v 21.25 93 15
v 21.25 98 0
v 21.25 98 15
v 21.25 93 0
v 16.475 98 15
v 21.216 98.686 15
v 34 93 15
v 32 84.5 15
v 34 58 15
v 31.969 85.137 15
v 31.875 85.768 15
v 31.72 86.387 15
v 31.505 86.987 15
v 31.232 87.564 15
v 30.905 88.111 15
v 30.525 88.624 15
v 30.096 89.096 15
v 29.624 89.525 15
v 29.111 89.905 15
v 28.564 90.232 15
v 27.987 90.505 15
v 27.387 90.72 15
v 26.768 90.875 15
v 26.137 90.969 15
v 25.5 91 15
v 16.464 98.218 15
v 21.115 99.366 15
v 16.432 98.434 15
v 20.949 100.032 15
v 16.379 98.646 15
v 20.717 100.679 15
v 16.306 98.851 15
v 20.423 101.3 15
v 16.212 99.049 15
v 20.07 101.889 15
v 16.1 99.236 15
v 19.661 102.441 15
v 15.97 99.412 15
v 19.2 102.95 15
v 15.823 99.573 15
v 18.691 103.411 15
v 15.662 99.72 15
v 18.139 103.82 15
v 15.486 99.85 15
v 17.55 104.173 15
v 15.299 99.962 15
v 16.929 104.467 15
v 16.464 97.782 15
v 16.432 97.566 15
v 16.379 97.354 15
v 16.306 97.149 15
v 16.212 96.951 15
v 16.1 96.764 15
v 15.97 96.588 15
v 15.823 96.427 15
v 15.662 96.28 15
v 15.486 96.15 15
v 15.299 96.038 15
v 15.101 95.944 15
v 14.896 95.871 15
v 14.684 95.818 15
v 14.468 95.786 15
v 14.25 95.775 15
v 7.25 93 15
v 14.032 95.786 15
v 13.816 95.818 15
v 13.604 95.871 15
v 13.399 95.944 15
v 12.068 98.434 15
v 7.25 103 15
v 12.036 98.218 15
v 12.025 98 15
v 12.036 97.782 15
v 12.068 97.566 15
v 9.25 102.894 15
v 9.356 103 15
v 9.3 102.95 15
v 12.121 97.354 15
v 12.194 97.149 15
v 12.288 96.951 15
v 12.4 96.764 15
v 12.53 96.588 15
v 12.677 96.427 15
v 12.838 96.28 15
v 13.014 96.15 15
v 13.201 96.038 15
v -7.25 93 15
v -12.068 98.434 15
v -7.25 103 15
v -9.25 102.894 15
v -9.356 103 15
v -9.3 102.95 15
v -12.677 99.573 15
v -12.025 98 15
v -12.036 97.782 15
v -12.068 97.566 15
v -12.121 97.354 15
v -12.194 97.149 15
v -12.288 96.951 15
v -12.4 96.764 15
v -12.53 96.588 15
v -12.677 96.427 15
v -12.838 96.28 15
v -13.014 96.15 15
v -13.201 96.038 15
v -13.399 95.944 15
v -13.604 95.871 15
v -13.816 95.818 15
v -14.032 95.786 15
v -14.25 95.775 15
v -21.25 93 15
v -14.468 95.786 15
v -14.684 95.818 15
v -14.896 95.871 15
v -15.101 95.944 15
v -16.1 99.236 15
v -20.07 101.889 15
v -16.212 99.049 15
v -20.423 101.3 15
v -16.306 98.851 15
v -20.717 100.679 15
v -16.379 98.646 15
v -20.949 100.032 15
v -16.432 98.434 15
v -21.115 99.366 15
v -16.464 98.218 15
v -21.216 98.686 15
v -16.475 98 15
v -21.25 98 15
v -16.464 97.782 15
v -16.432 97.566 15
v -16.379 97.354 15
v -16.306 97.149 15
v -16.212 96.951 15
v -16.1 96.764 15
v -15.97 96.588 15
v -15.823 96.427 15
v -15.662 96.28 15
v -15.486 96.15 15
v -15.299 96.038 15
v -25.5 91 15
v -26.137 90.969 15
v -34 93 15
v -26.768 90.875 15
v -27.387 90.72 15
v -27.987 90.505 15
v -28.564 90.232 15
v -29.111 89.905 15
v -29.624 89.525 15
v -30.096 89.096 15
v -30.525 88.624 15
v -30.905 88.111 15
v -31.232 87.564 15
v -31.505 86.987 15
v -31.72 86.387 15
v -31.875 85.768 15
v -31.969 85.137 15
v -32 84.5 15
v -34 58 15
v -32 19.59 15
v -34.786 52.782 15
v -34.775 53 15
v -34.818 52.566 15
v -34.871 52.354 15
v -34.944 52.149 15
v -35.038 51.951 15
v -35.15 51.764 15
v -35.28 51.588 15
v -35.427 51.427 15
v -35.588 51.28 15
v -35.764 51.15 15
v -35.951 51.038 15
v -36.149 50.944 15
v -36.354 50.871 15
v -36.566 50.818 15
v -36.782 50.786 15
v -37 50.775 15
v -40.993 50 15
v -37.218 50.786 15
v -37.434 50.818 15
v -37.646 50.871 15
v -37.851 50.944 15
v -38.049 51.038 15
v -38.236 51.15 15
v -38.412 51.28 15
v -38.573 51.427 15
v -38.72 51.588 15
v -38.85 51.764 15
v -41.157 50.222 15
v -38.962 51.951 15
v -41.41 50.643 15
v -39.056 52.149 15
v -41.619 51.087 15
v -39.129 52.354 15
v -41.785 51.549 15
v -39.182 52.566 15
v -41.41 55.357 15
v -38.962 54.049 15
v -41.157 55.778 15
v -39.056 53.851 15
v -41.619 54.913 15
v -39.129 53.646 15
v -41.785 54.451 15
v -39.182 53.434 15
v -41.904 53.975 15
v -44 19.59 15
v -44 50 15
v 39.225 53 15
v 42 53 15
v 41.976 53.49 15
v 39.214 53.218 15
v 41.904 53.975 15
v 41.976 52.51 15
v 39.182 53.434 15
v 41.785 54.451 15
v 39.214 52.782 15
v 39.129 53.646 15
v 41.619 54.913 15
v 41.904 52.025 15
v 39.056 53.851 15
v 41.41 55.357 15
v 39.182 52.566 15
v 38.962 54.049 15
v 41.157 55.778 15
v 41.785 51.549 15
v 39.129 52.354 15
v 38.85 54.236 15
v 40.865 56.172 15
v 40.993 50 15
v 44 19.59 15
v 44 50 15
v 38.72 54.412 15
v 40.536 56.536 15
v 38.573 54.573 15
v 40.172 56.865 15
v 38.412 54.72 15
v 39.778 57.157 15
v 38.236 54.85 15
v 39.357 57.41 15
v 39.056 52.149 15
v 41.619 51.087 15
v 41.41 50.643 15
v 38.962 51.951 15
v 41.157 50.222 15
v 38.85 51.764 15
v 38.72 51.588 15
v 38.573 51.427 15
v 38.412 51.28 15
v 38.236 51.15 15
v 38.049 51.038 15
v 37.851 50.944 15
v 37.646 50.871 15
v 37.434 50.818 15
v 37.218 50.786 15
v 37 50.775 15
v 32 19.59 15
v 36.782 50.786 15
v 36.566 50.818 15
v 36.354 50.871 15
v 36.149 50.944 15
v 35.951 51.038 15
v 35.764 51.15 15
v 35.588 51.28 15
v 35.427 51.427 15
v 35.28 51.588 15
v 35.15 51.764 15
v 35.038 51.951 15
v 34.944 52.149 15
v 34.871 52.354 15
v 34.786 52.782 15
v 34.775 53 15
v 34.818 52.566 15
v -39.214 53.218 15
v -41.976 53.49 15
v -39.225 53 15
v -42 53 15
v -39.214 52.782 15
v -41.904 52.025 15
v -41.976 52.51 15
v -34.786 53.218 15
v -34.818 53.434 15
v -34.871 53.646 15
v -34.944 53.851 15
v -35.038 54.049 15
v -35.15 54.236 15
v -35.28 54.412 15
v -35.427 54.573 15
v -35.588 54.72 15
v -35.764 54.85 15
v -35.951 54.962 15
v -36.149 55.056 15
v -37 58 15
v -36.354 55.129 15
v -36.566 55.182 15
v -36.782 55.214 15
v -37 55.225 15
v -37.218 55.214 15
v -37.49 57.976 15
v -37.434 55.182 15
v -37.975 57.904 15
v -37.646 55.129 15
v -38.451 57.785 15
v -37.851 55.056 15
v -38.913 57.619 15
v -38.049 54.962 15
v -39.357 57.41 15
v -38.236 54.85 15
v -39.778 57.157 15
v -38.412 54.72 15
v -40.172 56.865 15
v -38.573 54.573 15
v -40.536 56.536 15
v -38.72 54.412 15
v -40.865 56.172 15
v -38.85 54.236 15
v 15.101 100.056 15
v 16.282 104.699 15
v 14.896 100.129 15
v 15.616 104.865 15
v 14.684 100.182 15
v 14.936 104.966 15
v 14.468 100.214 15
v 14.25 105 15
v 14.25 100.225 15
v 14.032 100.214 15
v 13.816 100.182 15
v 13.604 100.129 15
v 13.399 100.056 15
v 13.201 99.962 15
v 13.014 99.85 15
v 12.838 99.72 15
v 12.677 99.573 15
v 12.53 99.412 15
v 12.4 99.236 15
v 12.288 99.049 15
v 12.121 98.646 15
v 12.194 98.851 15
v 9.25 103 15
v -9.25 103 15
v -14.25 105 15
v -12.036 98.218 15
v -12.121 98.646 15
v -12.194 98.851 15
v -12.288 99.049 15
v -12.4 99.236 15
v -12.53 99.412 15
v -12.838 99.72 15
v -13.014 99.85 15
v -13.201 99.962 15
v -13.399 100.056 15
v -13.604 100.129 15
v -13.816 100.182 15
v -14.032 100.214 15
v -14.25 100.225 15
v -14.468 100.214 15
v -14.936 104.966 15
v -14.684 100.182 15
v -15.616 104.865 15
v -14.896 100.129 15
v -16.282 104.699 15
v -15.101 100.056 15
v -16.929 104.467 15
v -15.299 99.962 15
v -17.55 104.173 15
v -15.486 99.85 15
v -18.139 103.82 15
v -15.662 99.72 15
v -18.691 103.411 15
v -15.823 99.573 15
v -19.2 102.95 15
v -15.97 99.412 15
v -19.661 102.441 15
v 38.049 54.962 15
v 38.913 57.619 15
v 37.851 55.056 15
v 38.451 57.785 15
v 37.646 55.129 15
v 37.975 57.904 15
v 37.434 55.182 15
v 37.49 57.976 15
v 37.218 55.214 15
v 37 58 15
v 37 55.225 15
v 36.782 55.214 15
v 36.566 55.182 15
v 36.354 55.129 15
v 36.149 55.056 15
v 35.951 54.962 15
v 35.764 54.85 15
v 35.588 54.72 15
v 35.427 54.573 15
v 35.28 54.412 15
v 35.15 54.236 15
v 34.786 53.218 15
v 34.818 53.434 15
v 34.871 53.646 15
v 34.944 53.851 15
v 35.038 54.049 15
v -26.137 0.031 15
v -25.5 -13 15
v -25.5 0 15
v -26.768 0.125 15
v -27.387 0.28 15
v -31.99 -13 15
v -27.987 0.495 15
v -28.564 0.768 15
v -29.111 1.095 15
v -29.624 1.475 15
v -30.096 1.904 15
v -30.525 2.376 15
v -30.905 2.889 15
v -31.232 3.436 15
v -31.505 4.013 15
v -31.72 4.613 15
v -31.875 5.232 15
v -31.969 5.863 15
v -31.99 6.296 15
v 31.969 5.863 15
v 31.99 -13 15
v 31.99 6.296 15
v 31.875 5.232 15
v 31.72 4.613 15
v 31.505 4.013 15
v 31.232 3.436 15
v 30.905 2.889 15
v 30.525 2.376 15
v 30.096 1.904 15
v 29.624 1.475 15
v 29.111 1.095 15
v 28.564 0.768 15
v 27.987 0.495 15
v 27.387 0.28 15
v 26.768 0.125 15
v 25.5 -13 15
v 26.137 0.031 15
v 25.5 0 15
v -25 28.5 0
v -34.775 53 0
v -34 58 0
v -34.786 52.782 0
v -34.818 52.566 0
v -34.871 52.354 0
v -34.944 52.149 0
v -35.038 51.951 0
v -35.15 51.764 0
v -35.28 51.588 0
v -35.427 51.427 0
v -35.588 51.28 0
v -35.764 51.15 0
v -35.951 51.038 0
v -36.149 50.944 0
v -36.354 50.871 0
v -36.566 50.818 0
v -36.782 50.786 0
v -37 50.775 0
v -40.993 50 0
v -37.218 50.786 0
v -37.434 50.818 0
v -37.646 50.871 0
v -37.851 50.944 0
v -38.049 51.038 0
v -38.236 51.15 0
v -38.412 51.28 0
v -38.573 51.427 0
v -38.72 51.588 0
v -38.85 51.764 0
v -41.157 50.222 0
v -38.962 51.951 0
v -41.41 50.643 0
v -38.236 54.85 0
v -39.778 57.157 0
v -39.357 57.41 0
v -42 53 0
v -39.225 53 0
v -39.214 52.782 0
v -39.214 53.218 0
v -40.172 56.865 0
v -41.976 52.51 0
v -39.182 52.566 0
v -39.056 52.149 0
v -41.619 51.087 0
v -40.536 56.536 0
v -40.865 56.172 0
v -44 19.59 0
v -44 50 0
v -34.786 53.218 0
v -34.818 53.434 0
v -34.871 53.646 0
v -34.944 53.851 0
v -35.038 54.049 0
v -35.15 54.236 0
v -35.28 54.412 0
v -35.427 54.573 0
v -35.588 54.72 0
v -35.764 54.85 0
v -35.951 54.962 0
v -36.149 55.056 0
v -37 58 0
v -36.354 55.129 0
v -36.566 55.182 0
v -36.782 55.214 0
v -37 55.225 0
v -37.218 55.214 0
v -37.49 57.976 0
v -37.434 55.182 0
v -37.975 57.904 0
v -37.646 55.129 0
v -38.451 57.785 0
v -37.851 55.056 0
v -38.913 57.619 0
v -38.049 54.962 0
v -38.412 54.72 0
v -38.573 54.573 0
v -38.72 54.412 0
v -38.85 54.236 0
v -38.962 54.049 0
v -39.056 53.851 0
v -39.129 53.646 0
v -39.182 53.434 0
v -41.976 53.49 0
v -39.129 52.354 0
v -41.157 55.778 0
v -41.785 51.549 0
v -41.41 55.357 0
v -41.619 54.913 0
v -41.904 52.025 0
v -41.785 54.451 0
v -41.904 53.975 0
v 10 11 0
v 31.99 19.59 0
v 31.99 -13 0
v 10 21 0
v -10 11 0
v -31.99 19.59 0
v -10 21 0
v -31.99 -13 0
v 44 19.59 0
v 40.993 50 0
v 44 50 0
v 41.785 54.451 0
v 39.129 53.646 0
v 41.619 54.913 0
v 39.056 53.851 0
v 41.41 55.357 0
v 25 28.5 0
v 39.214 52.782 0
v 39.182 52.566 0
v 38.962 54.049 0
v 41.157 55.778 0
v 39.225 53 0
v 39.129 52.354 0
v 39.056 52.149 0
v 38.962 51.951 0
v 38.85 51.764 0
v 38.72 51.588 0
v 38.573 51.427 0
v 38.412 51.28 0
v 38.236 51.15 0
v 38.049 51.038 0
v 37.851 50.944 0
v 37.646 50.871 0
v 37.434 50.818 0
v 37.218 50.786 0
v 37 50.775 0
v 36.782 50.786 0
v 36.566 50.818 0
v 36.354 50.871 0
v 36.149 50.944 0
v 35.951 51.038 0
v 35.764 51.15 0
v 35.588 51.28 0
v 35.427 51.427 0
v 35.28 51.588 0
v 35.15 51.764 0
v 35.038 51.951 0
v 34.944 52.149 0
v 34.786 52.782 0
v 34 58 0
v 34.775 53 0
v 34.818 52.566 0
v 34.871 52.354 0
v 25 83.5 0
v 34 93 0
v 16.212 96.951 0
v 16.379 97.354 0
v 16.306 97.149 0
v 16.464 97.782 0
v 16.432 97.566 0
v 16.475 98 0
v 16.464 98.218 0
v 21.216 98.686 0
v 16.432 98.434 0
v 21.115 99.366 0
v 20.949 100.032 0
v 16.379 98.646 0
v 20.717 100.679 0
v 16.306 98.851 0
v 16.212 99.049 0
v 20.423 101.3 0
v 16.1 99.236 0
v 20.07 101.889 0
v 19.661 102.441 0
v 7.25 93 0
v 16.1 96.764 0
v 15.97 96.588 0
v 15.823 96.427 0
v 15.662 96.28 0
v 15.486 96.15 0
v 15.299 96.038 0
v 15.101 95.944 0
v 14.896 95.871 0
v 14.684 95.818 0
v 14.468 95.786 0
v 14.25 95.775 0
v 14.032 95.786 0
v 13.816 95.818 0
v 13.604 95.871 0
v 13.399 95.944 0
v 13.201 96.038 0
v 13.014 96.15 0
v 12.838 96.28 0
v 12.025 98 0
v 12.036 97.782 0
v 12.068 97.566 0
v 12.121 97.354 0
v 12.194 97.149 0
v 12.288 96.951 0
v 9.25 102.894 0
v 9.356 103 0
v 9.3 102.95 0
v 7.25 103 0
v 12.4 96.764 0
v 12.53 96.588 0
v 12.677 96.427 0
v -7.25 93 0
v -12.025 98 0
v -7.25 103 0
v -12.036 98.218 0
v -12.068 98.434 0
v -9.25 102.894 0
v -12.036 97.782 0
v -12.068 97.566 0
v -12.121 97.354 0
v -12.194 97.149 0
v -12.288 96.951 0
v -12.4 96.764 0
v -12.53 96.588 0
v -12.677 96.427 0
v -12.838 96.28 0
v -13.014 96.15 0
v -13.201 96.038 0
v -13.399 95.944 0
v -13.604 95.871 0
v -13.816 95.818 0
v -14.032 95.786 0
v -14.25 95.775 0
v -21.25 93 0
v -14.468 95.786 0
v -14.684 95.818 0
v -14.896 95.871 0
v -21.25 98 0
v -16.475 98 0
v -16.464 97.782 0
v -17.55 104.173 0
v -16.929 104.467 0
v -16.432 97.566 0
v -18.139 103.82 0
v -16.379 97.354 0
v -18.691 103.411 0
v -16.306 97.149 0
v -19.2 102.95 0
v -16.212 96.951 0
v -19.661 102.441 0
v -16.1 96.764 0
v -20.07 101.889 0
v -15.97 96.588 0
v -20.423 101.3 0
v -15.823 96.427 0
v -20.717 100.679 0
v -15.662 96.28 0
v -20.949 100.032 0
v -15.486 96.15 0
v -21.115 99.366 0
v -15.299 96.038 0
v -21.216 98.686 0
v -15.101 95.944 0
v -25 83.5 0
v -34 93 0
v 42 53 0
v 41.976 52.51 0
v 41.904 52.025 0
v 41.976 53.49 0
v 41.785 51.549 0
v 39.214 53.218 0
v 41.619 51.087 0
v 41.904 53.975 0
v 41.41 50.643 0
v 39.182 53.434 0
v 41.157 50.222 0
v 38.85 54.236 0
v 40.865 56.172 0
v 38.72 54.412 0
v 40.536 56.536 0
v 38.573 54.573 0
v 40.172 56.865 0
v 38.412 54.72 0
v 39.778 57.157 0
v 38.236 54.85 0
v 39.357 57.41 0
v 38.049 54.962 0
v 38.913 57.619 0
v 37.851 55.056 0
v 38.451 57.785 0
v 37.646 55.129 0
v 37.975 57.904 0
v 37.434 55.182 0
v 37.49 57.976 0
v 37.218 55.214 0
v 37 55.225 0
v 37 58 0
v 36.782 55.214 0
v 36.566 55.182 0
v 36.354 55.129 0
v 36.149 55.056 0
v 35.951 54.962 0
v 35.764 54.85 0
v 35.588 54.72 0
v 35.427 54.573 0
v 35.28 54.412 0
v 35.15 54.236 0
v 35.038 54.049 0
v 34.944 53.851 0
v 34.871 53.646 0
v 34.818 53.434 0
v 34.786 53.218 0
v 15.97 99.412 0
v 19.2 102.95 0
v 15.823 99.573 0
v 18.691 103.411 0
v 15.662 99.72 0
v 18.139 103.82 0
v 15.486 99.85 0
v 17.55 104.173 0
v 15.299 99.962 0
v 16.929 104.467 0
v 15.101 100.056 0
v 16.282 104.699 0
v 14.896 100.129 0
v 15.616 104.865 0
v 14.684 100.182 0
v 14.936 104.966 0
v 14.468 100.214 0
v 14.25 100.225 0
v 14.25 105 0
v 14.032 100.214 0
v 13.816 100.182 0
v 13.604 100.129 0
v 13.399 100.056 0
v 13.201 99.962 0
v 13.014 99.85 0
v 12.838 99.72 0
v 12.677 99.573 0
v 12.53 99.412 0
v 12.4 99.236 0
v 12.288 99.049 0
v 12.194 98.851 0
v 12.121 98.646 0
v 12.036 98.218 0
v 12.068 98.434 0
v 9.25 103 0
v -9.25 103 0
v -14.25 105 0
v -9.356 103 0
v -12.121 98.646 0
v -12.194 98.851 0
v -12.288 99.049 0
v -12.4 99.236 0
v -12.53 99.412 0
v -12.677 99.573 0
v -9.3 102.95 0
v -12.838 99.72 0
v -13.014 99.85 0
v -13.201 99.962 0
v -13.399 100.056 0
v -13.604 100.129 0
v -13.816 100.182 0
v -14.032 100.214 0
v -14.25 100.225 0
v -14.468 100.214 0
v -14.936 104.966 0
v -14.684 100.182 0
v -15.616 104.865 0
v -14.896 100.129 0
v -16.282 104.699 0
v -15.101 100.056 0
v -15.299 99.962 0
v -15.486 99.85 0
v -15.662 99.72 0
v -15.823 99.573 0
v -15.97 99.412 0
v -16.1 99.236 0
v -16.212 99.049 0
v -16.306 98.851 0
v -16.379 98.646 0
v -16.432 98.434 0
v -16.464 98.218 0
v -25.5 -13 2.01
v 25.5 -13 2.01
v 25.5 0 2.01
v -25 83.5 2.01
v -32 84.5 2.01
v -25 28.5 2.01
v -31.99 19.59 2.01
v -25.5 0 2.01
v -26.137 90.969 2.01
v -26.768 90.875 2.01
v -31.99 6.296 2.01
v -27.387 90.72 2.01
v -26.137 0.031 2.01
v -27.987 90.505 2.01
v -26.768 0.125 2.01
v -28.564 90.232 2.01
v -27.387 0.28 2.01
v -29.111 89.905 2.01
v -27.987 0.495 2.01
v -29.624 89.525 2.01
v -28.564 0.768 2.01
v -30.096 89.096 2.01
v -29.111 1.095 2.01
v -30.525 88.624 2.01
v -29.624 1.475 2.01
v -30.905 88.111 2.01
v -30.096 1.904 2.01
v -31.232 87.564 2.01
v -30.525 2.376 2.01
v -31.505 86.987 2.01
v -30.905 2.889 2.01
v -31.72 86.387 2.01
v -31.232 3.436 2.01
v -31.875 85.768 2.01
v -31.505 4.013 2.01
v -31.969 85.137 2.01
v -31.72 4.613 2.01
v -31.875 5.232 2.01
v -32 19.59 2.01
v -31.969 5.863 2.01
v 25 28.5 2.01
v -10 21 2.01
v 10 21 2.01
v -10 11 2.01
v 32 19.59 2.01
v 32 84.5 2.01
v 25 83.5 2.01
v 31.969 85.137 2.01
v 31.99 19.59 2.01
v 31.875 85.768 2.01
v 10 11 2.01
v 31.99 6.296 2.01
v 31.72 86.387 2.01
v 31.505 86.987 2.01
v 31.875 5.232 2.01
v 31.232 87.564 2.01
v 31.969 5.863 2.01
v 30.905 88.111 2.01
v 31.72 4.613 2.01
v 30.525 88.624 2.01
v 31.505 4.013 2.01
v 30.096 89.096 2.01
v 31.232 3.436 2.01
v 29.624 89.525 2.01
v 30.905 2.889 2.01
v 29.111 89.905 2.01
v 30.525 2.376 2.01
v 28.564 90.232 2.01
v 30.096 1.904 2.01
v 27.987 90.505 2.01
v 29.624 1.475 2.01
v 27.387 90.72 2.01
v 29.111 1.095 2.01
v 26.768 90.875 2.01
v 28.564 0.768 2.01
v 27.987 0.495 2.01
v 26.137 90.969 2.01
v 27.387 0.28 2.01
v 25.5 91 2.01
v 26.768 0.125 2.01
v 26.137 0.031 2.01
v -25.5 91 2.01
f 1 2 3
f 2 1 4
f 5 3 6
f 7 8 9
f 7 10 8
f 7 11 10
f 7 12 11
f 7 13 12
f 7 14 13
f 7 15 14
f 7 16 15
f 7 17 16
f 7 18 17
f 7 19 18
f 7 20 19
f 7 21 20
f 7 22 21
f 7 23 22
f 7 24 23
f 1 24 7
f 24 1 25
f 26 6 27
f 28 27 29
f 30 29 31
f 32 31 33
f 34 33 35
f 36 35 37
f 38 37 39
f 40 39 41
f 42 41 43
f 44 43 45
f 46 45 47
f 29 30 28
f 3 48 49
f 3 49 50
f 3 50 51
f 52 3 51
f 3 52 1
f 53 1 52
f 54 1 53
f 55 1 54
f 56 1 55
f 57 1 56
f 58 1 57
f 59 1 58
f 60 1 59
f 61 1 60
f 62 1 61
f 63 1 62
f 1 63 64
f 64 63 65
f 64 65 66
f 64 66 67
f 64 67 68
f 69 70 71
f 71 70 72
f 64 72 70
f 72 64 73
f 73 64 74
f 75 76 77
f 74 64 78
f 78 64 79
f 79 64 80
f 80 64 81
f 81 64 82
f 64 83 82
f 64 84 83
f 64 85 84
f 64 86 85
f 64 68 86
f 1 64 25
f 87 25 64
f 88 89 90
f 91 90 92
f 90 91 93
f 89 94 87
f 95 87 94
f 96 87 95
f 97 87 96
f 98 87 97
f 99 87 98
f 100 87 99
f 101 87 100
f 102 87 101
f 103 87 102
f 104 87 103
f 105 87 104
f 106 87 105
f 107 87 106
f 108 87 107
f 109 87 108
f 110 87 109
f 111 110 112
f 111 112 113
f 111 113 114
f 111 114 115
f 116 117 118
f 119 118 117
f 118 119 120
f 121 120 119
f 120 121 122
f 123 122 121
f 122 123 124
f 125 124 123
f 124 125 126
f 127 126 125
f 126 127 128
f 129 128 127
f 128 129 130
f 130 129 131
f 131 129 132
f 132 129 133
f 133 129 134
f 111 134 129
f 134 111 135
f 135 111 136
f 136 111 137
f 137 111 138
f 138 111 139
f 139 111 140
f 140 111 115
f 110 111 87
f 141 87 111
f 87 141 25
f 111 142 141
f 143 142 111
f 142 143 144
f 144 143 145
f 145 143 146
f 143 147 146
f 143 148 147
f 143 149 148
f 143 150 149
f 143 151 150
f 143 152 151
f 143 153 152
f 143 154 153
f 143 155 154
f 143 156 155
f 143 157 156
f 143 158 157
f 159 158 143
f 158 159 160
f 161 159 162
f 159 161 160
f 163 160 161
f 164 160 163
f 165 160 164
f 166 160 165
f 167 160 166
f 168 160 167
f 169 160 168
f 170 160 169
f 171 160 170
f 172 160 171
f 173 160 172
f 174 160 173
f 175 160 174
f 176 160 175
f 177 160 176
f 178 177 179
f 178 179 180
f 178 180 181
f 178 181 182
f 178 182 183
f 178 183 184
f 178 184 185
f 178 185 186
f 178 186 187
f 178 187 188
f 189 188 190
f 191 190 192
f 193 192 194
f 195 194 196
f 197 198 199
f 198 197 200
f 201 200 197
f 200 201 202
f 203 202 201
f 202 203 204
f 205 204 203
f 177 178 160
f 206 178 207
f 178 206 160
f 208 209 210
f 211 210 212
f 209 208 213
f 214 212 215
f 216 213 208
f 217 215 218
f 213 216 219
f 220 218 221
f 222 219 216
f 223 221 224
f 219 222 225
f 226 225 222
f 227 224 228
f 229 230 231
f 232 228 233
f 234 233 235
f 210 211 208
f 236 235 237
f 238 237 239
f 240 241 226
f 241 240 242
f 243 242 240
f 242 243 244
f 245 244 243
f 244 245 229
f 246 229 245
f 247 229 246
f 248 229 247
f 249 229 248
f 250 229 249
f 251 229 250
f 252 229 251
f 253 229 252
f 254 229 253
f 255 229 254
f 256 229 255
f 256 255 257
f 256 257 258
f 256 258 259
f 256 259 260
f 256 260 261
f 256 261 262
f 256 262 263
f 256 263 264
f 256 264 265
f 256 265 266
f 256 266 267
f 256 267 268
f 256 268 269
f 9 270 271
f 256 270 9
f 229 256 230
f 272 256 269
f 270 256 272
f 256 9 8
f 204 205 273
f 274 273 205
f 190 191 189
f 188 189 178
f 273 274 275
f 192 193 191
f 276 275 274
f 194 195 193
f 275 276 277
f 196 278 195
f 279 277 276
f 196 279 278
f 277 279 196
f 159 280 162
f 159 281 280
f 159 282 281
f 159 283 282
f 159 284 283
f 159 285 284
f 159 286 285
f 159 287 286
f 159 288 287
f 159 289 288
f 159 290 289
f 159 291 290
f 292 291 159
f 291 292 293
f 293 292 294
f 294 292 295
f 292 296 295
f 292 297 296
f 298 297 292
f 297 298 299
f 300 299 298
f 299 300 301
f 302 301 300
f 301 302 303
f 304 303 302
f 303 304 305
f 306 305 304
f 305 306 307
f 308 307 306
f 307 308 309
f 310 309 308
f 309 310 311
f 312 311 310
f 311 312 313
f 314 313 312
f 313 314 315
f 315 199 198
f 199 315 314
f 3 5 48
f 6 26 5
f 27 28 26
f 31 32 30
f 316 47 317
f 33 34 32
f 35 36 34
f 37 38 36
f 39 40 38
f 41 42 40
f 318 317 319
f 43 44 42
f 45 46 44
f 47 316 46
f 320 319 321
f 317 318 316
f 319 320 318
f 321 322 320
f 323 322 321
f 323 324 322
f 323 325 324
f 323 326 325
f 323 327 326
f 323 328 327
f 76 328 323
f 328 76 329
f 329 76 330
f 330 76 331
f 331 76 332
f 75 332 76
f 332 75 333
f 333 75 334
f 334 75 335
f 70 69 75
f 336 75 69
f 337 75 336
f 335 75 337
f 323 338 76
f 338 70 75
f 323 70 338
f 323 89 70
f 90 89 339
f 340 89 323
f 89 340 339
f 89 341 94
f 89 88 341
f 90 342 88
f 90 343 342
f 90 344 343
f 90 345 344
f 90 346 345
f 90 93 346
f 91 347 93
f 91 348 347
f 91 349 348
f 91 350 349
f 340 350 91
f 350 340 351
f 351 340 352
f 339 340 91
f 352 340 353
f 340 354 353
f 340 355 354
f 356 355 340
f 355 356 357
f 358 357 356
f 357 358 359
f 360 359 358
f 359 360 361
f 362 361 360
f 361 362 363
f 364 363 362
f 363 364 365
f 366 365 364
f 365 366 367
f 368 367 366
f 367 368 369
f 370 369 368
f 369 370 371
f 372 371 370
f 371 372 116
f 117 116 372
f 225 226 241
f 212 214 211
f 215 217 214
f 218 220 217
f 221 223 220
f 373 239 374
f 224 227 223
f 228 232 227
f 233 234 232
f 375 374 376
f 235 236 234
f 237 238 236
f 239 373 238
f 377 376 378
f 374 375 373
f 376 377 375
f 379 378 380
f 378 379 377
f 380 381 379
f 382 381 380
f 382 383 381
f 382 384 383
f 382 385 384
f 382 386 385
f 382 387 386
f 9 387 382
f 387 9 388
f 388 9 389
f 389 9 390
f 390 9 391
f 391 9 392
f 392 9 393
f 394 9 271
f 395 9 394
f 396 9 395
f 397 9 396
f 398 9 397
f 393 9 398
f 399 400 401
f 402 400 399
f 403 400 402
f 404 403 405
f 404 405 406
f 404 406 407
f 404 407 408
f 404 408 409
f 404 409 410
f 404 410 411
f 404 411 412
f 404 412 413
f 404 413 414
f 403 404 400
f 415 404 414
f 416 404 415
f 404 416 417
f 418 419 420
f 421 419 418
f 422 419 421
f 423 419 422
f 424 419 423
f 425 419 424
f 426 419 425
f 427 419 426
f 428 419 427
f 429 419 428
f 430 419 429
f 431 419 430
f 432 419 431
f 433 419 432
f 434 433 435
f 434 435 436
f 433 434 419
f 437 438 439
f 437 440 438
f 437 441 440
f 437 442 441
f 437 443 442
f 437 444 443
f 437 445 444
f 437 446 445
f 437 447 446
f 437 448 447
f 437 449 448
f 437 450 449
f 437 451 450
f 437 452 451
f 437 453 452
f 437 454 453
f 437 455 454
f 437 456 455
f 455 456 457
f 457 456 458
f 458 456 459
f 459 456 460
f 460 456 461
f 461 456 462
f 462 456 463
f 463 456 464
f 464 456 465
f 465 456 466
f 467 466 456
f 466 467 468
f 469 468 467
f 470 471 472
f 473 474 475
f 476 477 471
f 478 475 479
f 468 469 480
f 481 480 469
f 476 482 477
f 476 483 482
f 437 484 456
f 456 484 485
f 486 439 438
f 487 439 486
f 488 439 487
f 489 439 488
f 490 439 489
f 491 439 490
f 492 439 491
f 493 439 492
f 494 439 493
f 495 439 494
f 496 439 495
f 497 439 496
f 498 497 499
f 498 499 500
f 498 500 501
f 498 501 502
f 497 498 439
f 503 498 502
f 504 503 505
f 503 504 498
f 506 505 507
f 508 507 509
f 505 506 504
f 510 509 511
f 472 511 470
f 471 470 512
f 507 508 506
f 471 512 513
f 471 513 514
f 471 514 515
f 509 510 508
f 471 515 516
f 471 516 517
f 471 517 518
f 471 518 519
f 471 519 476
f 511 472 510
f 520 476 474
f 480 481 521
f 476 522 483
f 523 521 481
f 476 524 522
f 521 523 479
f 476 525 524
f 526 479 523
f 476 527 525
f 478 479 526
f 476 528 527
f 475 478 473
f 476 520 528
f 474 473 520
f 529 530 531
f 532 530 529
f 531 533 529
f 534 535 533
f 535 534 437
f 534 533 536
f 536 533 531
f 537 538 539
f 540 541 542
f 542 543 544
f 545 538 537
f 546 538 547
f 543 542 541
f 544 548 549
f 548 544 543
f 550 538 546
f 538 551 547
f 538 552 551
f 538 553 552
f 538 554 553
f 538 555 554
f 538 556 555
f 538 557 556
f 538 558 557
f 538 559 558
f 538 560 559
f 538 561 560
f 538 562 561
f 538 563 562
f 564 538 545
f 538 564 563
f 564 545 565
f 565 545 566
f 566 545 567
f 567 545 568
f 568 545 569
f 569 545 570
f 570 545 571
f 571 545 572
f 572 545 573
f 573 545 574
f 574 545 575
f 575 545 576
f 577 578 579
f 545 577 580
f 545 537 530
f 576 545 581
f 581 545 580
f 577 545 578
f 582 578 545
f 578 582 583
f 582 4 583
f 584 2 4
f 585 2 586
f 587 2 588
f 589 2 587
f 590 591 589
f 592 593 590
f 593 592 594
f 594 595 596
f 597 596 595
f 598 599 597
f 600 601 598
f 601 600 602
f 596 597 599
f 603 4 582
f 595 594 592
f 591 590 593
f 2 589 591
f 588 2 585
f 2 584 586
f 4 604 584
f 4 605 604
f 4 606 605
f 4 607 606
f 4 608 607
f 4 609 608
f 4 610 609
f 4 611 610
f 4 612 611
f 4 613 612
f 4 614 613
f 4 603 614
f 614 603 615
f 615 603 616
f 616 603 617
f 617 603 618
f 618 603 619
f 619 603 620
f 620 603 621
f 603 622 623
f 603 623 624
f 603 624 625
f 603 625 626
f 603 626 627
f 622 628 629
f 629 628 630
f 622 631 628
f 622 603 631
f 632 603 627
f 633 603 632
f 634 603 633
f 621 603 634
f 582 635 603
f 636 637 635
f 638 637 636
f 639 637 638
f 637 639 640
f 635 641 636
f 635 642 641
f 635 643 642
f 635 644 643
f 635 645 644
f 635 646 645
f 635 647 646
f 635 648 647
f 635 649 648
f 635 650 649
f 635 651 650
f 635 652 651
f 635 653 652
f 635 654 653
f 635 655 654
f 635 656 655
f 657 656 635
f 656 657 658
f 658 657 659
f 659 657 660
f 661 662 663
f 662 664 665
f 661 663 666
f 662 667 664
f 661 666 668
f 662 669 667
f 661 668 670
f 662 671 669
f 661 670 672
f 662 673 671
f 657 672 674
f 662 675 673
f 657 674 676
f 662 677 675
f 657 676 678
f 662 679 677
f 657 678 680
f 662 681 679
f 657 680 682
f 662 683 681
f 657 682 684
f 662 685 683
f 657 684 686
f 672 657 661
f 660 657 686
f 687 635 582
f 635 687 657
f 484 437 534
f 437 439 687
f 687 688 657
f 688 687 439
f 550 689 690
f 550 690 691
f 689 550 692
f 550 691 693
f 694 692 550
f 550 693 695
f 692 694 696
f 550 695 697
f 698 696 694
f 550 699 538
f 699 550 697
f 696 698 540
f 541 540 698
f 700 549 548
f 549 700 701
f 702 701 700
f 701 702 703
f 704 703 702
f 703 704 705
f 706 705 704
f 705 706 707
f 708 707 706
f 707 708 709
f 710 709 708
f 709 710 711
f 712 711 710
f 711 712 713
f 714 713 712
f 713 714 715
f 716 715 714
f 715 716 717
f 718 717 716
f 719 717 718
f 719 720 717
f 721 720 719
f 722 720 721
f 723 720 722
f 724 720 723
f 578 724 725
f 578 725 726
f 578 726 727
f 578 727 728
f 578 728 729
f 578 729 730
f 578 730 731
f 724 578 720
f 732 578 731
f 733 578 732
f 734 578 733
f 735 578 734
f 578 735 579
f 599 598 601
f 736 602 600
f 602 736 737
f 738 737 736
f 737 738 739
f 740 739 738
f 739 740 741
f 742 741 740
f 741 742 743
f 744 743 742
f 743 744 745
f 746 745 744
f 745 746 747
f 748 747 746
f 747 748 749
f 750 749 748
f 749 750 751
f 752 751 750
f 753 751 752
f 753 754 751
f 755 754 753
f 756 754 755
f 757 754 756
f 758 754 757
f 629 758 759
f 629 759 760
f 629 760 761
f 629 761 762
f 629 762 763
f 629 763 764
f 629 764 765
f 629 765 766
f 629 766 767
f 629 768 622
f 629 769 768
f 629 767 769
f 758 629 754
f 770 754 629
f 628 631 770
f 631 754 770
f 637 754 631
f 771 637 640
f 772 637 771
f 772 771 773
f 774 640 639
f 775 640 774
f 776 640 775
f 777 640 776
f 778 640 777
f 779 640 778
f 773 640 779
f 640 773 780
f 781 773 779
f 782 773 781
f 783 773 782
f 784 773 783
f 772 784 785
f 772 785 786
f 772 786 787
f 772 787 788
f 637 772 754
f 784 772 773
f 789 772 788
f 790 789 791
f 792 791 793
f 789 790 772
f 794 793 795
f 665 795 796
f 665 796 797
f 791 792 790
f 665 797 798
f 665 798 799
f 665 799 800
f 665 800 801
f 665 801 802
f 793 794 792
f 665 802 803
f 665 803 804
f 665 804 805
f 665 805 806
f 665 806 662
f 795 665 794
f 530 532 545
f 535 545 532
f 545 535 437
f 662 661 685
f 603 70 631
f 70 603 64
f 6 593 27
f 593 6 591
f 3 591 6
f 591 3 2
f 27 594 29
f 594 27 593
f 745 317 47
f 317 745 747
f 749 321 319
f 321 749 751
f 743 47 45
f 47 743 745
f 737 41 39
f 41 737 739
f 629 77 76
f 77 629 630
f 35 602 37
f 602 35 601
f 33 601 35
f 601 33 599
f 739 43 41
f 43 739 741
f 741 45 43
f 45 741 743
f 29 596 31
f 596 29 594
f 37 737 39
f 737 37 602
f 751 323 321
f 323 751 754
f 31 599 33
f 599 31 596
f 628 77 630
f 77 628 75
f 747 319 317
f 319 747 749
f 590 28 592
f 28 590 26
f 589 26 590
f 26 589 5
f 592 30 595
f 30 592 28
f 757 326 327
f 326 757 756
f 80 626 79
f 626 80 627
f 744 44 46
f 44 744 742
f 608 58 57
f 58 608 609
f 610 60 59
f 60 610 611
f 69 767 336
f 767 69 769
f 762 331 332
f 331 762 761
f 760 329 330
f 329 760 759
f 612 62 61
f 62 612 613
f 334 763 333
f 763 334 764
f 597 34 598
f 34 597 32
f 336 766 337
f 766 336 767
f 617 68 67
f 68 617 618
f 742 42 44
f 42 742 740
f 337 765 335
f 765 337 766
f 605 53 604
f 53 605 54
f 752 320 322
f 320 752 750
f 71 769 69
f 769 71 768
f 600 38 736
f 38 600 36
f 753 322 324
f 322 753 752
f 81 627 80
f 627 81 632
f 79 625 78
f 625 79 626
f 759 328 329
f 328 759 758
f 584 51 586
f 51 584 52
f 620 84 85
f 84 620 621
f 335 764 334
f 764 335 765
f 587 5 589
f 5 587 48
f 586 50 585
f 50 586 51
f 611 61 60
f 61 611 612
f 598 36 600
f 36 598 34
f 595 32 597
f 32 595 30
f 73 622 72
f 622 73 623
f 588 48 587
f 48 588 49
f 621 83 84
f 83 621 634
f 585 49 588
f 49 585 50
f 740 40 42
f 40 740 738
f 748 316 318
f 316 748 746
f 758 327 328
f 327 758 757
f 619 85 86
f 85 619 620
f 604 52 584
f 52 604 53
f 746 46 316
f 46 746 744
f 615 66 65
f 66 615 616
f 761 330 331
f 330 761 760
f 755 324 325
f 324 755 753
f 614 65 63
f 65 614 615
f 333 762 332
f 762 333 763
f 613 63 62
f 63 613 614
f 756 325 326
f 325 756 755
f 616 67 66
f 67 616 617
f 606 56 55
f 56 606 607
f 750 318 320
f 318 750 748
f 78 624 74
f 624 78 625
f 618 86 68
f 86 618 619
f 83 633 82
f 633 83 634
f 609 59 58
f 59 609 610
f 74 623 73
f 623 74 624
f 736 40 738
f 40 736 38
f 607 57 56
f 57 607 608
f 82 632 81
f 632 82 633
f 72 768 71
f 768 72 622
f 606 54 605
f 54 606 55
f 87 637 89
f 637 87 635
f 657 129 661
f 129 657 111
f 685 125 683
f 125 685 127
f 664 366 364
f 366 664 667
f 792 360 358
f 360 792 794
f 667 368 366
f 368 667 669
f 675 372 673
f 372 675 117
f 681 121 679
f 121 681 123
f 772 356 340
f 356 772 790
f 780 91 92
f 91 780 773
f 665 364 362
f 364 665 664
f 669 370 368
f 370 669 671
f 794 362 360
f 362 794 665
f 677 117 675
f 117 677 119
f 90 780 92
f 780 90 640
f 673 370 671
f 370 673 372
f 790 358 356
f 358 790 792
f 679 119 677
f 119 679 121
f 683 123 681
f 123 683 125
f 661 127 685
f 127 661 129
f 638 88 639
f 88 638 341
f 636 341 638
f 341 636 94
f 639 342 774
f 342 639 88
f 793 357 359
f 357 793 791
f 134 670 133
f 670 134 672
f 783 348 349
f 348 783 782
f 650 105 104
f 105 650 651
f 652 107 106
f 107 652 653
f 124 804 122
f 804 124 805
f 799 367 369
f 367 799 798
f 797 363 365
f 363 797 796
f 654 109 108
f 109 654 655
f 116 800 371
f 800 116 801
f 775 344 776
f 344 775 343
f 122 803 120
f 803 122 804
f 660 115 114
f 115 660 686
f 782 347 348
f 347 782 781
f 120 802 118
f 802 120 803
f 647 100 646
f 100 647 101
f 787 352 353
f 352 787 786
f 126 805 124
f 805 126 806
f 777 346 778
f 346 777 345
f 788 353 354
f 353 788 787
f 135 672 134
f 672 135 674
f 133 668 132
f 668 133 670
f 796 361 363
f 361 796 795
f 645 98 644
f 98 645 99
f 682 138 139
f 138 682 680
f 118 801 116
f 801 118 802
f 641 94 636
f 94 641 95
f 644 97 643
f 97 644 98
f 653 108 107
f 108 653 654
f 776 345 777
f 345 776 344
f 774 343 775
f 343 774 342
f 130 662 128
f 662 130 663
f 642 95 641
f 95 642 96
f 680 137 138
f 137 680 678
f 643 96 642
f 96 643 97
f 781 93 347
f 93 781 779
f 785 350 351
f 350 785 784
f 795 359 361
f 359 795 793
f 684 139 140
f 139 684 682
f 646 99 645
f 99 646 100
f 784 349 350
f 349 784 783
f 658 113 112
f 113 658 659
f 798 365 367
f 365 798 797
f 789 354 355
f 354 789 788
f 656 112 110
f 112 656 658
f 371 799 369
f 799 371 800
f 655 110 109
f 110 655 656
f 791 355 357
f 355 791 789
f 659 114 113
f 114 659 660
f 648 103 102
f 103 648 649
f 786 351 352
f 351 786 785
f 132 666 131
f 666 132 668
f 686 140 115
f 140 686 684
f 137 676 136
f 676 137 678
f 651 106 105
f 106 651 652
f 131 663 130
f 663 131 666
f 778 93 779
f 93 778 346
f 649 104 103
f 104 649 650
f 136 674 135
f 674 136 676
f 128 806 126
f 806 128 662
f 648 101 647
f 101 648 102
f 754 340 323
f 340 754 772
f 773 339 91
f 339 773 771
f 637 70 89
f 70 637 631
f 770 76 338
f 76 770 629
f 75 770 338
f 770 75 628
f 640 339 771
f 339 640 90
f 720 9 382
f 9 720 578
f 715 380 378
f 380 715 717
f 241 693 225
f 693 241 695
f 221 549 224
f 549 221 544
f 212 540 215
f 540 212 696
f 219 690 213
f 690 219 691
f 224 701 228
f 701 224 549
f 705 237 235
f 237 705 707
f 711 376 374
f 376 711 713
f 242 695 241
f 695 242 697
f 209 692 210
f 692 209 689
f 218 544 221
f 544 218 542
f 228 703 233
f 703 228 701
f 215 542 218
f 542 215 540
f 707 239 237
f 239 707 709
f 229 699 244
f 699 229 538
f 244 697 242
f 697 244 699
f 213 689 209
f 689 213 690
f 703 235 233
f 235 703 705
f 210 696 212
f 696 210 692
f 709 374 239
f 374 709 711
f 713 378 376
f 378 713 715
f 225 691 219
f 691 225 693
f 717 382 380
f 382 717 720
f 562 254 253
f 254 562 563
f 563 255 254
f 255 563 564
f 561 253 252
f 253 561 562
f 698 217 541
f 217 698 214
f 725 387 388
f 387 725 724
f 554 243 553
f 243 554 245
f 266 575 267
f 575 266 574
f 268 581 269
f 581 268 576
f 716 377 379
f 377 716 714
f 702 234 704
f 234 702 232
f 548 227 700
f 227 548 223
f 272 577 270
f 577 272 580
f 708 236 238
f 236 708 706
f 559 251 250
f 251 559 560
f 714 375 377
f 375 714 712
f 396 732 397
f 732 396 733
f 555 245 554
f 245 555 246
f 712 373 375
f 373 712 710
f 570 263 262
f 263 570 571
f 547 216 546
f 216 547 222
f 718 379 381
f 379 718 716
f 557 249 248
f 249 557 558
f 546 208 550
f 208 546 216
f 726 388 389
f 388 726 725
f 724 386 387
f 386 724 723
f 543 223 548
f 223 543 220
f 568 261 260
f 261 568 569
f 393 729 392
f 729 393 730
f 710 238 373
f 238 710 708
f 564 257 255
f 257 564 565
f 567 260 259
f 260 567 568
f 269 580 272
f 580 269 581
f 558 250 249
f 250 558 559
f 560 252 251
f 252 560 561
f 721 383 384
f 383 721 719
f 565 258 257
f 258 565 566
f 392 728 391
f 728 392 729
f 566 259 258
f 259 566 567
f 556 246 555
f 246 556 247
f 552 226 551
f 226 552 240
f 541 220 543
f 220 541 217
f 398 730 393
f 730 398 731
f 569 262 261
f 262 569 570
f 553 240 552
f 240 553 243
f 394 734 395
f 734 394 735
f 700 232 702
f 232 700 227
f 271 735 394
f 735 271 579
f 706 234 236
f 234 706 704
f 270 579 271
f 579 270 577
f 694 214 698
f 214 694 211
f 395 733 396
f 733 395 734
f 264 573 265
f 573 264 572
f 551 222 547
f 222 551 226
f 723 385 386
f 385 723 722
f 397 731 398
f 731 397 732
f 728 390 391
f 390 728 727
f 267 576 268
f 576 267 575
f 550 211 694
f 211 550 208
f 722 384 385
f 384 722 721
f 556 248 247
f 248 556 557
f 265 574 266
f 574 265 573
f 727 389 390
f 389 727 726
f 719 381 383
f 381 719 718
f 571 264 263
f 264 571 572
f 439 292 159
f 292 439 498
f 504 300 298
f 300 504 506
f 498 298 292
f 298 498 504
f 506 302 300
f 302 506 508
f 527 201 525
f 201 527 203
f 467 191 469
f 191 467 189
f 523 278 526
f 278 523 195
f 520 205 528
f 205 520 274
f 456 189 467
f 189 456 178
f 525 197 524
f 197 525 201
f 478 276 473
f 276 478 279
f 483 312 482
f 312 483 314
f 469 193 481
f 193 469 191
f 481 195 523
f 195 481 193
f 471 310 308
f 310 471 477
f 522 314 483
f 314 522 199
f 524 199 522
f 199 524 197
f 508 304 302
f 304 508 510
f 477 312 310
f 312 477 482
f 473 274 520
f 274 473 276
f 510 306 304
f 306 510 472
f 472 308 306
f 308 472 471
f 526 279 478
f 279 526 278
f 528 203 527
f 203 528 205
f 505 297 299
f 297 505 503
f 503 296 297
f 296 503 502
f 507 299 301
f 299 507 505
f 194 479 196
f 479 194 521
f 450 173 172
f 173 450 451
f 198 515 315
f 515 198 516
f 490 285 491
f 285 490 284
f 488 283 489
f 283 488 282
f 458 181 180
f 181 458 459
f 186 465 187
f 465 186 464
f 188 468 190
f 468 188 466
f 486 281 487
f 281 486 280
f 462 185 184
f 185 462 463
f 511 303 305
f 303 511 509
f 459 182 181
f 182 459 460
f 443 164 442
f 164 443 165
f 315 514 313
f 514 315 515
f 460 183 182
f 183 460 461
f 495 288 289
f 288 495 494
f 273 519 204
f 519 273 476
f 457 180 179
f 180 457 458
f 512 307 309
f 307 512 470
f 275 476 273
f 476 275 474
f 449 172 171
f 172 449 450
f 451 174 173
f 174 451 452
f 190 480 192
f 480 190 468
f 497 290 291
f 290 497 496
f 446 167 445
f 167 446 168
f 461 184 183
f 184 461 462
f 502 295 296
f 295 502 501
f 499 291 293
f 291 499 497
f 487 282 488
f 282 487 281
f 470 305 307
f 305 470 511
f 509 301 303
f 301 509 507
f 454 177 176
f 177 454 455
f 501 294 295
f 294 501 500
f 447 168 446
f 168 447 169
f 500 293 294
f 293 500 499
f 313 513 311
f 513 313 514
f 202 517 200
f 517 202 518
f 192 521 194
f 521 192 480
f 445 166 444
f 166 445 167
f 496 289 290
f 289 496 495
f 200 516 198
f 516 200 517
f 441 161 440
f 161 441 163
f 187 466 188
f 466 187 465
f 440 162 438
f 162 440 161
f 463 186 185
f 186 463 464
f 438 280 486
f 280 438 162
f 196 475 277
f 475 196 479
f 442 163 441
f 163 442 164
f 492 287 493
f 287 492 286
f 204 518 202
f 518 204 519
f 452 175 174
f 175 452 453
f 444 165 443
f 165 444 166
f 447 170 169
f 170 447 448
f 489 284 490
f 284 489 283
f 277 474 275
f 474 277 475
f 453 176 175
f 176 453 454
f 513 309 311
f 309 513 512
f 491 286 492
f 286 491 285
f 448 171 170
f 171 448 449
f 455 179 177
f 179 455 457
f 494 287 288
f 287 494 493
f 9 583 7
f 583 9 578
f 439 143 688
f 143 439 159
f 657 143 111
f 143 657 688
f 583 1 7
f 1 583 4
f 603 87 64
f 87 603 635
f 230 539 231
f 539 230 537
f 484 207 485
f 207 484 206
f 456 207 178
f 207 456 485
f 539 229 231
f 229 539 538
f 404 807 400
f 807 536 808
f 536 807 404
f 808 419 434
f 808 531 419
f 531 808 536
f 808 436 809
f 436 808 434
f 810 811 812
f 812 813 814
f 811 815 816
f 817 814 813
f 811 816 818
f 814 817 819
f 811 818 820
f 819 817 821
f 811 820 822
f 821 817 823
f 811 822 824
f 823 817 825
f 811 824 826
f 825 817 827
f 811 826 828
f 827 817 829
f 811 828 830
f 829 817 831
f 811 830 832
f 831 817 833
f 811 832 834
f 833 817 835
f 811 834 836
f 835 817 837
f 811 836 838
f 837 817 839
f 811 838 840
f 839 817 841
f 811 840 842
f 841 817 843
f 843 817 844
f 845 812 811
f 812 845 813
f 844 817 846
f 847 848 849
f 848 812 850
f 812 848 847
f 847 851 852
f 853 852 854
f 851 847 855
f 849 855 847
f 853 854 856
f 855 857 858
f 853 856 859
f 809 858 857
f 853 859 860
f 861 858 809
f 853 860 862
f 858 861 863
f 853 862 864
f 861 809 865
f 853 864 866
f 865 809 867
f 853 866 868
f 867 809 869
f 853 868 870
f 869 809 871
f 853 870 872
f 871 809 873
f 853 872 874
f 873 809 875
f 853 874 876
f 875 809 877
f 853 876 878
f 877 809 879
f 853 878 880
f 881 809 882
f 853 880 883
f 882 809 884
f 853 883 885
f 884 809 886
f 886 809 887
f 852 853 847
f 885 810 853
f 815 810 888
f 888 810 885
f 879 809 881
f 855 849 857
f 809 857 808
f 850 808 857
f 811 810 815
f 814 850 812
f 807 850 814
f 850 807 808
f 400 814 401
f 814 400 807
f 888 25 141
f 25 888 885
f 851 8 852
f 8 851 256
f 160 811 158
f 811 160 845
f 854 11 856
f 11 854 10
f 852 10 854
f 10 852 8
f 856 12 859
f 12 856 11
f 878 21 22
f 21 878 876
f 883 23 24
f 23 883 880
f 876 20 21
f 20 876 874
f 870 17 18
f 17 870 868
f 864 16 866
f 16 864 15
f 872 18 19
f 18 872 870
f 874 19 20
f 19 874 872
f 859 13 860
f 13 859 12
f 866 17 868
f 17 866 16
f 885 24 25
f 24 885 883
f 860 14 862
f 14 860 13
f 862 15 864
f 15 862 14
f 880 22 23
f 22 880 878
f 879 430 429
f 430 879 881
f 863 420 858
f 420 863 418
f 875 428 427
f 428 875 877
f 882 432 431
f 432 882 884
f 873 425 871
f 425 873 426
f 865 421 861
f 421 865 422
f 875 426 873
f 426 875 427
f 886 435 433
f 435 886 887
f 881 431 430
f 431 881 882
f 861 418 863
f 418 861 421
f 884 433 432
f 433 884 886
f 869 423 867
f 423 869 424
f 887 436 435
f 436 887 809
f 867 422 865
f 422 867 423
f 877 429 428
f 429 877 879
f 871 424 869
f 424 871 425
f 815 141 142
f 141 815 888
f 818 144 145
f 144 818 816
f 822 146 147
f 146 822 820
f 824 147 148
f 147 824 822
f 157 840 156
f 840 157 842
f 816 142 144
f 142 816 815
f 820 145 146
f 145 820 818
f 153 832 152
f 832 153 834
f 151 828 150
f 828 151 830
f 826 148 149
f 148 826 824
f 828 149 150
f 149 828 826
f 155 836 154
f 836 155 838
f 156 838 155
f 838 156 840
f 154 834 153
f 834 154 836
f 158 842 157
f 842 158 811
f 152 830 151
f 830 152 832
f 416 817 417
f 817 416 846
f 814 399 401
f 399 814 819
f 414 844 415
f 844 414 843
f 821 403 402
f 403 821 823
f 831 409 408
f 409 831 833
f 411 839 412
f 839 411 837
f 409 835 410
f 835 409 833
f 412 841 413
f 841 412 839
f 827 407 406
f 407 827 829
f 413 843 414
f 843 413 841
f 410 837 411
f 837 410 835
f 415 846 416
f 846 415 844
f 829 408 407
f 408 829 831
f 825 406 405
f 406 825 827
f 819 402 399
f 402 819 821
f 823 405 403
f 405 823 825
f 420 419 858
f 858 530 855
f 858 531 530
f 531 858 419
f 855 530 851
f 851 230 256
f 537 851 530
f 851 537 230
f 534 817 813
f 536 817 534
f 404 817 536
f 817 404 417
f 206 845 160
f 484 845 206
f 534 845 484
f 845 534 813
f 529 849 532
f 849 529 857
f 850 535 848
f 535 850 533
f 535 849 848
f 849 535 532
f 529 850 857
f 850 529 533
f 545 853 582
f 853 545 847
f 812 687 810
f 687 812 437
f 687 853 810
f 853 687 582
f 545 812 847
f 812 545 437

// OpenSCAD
include <bot-parts.scad>

//motor();
//battery();
//distance_sensor();
//color_sensor();
//connector(10);
//driver_board();

//assembly();

battery_box();
//motor_box_bottom();
//motor_box_top();
//top_frame();
//bottom_frame();
